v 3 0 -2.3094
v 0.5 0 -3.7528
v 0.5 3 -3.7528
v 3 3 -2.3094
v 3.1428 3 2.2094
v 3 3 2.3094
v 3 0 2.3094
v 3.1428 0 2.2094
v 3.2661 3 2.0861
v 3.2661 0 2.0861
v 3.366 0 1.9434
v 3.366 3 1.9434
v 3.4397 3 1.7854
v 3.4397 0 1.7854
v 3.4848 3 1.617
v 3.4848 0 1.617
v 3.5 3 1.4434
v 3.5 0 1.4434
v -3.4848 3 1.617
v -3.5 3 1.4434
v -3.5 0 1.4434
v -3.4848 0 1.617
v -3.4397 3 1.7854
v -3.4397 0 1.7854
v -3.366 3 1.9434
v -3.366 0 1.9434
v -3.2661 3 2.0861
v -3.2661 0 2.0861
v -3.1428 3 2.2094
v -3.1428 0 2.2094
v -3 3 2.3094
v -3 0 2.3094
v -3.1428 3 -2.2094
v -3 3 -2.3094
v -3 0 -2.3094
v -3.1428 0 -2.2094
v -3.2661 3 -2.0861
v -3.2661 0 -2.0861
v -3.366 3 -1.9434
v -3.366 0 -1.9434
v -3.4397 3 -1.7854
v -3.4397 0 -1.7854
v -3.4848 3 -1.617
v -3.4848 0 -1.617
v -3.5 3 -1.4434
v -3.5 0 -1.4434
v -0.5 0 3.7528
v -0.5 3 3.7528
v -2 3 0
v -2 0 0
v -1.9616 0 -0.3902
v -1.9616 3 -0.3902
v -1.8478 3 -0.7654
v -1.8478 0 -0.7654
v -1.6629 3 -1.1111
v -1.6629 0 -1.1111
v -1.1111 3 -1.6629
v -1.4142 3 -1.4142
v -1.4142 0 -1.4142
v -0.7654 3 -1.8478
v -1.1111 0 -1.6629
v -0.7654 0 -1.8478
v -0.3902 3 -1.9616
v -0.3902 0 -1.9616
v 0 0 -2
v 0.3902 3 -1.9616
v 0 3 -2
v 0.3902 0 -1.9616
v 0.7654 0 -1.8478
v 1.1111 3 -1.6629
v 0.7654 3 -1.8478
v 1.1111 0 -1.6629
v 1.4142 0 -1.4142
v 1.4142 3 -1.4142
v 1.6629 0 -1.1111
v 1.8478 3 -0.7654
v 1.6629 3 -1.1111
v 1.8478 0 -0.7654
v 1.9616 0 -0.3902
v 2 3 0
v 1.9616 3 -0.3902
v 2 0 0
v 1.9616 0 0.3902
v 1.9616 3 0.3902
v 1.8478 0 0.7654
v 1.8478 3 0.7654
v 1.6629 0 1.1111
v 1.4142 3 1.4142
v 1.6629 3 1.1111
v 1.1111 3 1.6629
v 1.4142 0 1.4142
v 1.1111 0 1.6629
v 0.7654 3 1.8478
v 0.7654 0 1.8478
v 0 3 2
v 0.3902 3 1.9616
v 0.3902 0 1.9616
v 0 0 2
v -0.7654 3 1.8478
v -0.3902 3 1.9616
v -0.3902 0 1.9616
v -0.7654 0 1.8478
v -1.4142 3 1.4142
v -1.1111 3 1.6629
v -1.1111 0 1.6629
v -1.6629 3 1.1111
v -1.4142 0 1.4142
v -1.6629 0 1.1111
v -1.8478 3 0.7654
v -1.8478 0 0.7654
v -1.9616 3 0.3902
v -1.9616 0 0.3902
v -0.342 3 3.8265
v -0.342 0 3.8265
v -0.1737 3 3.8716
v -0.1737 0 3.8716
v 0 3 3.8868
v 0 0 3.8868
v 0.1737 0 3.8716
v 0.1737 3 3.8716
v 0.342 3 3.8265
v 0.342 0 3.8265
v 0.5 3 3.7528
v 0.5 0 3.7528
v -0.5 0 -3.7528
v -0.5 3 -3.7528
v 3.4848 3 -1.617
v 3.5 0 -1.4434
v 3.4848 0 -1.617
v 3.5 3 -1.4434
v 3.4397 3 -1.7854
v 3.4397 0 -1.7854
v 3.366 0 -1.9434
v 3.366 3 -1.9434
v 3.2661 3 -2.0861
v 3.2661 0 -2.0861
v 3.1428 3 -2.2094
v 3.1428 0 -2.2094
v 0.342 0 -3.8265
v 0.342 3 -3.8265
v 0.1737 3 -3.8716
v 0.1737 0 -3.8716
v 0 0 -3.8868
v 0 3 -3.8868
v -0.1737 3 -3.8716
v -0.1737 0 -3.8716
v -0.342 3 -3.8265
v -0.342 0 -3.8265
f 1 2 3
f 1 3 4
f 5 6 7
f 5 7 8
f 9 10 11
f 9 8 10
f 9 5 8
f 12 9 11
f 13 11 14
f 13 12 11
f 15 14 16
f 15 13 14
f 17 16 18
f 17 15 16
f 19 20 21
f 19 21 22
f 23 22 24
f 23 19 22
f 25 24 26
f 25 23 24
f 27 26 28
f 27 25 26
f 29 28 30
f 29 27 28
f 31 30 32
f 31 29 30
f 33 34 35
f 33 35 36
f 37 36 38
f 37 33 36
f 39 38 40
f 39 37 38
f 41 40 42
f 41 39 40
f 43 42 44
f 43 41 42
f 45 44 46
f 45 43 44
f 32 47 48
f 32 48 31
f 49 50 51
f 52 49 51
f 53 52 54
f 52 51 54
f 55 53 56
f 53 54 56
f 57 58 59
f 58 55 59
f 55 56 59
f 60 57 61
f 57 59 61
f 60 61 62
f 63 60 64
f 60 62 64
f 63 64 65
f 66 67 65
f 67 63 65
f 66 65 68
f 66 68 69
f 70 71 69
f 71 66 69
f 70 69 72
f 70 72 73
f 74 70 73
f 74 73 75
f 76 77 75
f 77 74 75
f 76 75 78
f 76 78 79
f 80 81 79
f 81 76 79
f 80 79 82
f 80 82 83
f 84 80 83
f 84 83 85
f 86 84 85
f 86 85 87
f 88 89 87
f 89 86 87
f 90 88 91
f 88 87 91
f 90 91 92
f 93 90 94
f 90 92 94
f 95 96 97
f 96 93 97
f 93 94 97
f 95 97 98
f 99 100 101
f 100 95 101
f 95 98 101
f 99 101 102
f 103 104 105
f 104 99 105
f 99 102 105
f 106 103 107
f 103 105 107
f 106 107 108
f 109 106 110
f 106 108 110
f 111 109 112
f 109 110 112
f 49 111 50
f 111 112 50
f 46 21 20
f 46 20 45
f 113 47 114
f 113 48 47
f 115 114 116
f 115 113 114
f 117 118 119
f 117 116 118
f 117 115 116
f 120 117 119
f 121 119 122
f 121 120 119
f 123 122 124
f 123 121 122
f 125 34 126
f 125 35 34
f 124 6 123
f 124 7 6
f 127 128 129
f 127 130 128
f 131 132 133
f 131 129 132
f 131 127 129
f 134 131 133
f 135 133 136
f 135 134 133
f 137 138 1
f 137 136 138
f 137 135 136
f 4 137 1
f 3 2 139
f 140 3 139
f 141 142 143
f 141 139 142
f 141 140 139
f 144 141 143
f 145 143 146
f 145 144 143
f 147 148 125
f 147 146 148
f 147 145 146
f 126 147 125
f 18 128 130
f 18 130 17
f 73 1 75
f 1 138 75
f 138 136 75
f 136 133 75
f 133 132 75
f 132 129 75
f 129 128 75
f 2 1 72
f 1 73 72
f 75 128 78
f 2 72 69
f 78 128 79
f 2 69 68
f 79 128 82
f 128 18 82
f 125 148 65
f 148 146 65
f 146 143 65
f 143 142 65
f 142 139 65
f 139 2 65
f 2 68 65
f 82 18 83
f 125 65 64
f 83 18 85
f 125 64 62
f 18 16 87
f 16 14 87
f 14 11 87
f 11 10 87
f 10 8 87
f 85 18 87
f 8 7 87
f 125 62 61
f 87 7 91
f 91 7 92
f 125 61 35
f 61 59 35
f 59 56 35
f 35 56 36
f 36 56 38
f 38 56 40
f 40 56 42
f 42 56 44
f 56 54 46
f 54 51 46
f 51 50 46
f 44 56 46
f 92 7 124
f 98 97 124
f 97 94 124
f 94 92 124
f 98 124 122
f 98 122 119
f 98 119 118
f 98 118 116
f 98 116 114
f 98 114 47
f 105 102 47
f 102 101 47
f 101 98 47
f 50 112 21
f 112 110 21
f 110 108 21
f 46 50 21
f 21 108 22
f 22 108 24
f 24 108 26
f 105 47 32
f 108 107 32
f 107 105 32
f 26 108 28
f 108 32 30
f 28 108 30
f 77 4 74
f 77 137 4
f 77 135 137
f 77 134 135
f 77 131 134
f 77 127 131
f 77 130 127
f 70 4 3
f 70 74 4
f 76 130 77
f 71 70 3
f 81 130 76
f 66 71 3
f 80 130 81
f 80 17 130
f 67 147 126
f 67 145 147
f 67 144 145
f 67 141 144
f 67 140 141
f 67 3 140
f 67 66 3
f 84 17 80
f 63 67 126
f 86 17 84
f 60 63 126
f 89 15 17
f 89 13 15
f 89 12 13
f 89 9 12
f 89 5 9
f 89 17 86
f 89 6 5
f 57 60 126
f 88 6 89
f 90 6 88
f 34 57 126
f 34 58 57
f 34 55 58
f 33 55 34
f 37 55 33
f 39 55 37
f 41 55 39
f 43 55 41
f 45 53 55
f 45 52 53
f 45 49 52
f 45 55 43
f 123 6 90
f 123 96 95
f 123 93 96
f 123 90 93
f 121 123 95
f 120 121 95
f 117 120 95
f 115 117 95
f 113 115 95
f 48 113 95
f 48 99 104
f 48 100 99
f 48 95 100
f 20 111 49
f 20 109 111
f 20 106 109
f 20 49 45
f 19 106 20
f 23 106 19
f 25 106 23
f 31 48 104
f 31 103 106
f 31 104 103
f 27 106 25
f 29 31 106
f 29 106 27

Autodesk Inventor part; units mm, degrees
ref_plane "YZ Plane" through (0, 0, 0) normal (1, 0, 0) x (0, 1, 0)
ref_plane "XZ Plane" through (0, 0, 0) normal (0, 1, 0) x (-1, 0, 0)
ref_plane "XY Plane" through (0, 0, 0) normal (0, 0, 1) x (1, 0, 0)
sketch "Sketch1" plane through (0, 0, 0) normal (0, 1, 0) x (-1, 0, 0)
  circle A0 centre (0, 0) radius 2
  line L0 (3.5, -2.0207) -> (0, -4.0415)
  line L1 (0, -4.0415) -> (-3.5, -2.0207)
  line L2 (-3.5, -2.0207) -> (-3.5, 2.0207)
  line L3 (-3.5, 2.0207) -> (0, 4.0415)
  line L4 (0, 4.0415) -> (3.5, 2.0207)
  line L5 (3.5, 2.0207) -> (3.5, -2.0207)
  dimension "d0" = 4
  dimension "d1" = 3.5
extrude "Extrusion1" add sketch "Sketch1" along normal blind 3
thread "Thread1" size "M4x0.7" class "6H" standard "ANSI Metric M Profile" full length
fillet "Fillet1" radius 1 6 edges at (-3.5, 1.5, 2.0207) (0, 1.5, 4.0415) (3.5, 1.5, 2.0207) (3.5, 1.5, -2.0207) (0, 1.5, -4.0415) (-3.5, 1.5, -2.0207)
properties part number "Moer"
